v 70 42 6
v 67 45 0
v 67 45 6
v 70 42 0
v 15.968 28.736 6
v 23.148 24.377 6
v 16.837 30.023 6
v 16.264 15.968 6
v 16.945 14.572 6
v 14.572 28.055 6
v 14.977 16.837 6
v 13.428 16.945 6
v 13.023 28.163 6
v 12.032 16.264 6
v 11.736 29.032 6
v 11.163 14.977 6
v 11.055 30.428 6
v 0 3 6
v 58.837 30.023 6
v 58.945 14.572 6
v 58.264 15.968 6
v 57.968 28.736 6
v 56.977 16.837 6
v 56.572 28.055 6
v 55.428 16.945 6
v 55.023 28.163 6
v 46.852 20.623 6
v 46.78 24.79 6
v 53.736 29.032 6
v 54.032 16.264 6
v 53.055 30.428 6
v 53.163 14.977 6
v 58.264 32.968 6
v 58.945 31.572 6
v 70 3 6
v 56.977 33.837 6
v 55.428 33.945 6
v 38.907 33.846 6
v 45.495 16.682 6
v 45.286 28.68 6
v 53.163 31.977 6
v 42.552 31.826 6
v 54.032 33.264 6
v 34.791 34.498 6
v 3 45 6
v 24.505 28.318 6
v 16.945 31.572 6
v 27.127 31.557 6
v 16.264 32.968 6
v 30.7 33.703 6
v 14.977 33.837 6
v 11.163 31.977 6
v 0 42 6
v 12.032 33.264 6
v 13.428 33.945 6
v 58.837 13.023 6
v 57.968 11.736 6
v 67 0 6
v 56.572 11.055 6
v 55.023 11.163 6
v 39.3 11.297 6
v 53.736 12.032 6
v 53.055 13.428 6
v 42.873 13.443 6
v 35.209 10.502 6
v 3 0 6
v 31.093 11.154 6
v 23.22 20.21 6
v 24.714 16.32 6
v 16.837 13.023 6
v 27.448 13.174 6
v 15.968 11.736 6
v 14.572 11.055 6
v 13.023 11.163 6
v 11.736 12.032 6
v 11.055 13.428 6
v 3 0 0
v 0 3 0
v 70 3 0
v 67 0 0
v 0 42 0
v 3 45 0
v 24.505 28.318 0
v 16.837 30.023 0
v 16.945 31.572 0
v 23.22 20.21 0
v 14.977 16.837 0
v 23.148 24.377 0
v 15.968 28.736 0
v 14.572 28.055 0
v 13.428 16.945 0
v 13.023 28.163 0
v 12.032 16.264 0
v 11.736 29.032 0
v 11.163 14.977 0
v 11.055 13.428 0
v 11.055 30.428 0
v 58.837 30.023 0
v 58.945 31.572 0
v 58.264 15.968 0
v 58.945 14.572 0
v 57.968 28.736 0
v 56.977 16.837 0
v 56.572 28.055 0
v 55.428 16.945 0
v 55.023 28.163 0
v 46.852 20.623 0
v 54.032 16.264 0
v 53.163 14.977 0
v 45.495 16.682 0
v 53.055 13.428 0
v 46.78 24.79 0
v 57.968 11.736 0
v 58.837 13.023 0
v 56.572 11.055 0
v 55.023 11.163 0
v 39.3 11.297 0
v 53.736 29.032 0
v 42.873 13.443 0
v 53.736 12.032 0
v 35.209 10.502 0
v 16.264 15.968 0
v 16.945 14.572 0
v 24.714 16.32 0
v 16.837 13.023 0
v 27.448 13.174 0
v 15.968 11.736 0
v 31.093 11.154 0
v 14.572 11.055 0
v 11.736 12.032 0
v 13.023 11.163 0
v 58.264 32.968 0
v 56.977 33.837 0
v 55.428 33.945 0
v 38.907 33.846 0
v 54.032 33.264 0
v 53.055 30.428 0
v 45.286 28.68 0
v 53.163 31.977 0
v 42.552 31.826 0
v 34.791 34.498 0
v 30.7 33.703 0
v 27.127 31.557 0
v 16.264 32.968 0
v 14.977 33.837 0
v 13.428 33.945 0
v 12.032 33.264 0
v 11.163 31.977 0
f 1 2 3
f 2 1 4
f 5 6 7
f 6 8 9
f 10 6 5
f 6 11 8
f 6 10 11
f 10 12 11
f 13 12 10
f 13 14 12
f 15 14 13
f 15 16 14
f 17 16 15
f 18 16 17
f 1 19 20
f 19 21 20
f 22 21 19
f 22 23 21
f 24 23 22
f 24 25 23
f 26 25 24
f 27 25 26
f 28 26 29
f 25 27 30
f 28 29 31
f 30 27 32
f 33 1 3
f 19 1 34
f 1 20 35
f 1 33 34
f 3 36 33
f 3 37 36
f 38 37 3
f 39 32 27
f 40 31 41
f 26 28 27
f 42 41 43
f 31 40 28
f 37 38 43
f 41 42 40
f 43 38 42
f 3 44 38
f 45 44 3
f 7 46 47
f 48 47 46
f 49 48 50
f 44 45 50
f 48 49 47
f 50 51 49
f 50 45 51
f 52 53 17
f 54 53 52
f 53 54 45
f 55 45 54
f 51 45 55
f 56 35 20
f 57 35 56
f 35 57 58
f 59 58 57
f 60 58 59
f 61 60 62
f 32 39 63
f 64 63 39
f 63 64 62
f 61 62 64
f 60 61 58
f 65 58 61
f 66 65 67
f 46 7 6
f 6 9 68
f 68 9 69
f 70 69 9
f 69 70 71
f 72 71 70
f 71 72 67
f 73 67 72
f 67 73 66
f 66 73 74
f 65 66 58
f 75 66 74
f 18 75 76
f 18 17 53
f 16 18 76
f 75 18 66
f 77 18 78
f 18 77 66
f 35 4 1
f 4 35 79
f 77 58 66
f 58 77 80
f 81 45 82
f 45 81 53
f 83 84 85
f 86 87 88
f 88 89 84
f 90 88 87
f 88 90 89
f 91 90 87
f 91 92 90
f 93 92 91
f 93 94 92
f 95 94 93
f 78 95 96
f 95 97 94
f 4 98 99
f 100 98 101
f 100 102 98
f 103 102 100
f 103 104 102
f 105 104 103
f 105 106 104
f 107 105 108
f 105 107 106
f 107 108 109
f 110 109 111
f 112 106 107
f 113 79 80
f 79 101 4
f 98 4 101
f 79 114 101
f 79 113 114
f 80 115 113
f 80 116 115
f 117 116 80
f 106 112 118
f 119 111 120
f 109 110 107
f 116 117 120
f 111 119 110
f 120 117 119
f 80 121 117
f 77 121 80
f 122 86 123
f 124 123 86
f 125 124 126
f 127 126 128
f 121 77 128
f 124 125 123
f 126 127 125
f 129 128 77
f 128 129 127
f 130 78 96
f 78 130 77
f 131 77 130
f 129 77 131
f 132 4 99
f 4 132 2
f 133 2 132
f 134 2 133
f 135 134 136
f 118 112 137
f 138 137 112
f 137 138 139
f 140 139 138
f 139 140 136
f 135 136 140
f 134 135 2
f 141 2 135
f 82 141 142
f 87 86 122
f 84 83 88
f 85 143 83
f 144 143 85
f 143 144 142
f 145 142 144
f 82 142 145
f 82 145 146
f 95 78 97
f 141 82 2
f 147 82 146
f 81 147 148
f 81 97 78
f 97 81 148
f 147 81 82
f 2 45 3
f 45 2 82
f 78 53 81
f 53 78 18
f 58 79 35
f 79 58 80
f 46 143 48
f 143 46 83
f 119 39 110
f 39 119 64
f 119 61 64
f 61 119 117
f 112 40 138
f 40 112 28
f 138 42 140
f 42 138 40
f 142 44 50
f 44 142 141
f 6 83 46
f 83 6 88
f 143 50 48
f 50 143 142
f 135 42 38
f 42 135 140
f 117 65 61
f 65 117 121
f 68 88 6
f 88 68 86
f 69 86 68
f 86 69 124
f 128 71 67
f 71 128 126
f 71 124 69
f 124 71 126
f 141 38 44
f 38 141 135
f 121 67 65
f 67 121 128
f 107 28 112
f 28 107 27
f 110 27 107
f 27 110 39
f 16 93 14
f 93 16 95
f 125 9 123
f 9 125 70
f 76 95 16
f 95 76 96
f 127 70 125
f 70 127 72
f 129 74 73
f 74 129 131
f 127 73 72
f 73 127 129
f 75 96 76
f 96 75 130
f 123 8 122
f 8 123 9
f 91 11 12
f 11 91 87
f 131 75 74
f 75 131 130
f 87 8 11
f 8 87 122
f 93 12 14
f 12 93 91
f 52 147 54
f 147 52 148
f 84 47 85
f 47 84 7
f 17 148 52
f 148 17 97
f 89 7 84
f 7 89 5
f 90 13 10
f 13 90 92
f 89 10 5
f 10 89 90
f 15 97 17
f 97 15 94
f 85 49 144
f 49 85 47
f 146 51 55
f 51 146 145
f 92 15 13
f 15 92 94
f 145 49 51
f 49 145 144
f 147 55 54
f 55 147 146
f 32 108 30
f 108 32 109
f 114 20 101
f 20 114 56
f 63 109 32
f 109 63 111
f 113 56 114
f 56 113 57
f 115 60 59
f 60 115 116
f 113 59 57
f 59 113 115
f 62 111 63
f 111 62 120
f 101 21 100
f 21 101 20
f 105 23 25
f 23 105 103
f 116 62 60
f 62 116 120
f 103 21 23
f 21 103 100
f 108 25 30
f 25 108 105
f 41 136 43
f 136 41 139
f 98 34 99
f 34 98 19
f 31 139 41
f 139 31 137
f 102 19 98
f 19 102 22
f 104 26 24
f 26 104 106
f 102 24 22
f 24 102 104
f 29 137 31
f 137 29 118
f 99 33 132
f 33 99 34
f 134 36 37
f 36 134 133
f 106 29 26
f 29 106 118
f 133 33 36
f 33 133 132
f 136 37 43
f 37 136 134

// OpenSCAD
$fn = 32;

// ----------------------------------------------------------------------
// Spacer plate: rect 70 x 45
// ----------------------------------------------------------------------

// --- parameters (mm) ---
bore_r = 12;              // centre bore radius
bolt_r = 3;               // bolt hole radius
plate_t = 6;              // plate thickness, Z (extrusion height)
plate_l = 70;             // plate length, X
plate_w = 45;             // plate width, Y
inset = 14;               // corner hole inset

profile = [[3, 0], [67, 0], [70, 3], [70, 42], [67, 45], [3, 45], [0, 42], [0, 3]];  // primary outline, 8 points, counter clockwise
void_1 = [[46.78, 24.79], [45.286, 28.68], [42.552, 31.826], [38.907, 33.846], [34.791, 34.498], [30.7, 33.703], [27.127, 31.557], [24.505, 28.318], [23.148, 24.377], [23.22, 20.21], [24.714, 16.32], [27.448, 13.174], [31.093, 11.154], [35.209, 10.502], [39.3, 11.297], [42.873, 13.443], [45.495, 16.682], [46.852, 20.623]];  // centre bore, 18 points
void_2 = [[16.945, 14.572], [16.264, 15.968], [14.977, 16.837], [13.428, 16.945], [12.032, 16.264], [11.163, 14.977], [11.055, 13.428], [11.736, 12.032], [13.023, 11.163], [14.572, 11.055], [15.968, 11.736], [16.837, 13.023]];  // corner hole, 12 points
void_3 = [[16.945, 31.572], [16.264, 32.968], [14.977, 33.837], [13.428, 33.945], [12.032, 33.264], [11.163, 31.977], [11.055, 30.428], [11.736, 29.032], [13.023, 28.163], [14.572, 28.055], [15.968, 28.736], [16.837, 30.023]];  // corner hole, 12 points
void_4 = [[58.945, 14.572], [58.264, 15.968], [56.977, 16.837], [55.428, 16.945], [54.032, 16.264], [53.163, 14.977], [53.055, 13.428], [53.736, 12.032], [55.023, 11.163], [56.572, 11.055], [57.968, 11.736], [58.837, 13.023]];  // corner hole, 12 points
void_5 = [[58.945, 31.572], [58.264, 32.968], [56.977, 33.837], [55.428, 33.945], [54.032, 33.264], [53.163, 31.977], [53.055, 30.428], [53.736, 29.032], [55.023, 28.163], [56.572, 28.055], [57.968, 28.736], [58.837, 30.023]];  // corner hole, 12 points

// --- the one profile operation ---
difference() {
  linear_extrude(height = plate_t) polygon(points = profile);
  translate([0, 0, -1])
    linear_extrude(height = plate_t + 2) polygon(points = void_1);
  translate([0, 0, -1])
    linear_extrude(height = plate_t + 2) polygon(points = void_2);
  translate([0, 0, -1])
    linear_extrude(height = plate_t + 2) polygon(points = void_3);
  translate([0, 0, -1])
    linear_extrude(height = plate_t + 2) polygon(points = void_4);
  translate([0, 0, -1])
    linear_extrude(height = plate_t + 2) polygon(points = void_5);
}
